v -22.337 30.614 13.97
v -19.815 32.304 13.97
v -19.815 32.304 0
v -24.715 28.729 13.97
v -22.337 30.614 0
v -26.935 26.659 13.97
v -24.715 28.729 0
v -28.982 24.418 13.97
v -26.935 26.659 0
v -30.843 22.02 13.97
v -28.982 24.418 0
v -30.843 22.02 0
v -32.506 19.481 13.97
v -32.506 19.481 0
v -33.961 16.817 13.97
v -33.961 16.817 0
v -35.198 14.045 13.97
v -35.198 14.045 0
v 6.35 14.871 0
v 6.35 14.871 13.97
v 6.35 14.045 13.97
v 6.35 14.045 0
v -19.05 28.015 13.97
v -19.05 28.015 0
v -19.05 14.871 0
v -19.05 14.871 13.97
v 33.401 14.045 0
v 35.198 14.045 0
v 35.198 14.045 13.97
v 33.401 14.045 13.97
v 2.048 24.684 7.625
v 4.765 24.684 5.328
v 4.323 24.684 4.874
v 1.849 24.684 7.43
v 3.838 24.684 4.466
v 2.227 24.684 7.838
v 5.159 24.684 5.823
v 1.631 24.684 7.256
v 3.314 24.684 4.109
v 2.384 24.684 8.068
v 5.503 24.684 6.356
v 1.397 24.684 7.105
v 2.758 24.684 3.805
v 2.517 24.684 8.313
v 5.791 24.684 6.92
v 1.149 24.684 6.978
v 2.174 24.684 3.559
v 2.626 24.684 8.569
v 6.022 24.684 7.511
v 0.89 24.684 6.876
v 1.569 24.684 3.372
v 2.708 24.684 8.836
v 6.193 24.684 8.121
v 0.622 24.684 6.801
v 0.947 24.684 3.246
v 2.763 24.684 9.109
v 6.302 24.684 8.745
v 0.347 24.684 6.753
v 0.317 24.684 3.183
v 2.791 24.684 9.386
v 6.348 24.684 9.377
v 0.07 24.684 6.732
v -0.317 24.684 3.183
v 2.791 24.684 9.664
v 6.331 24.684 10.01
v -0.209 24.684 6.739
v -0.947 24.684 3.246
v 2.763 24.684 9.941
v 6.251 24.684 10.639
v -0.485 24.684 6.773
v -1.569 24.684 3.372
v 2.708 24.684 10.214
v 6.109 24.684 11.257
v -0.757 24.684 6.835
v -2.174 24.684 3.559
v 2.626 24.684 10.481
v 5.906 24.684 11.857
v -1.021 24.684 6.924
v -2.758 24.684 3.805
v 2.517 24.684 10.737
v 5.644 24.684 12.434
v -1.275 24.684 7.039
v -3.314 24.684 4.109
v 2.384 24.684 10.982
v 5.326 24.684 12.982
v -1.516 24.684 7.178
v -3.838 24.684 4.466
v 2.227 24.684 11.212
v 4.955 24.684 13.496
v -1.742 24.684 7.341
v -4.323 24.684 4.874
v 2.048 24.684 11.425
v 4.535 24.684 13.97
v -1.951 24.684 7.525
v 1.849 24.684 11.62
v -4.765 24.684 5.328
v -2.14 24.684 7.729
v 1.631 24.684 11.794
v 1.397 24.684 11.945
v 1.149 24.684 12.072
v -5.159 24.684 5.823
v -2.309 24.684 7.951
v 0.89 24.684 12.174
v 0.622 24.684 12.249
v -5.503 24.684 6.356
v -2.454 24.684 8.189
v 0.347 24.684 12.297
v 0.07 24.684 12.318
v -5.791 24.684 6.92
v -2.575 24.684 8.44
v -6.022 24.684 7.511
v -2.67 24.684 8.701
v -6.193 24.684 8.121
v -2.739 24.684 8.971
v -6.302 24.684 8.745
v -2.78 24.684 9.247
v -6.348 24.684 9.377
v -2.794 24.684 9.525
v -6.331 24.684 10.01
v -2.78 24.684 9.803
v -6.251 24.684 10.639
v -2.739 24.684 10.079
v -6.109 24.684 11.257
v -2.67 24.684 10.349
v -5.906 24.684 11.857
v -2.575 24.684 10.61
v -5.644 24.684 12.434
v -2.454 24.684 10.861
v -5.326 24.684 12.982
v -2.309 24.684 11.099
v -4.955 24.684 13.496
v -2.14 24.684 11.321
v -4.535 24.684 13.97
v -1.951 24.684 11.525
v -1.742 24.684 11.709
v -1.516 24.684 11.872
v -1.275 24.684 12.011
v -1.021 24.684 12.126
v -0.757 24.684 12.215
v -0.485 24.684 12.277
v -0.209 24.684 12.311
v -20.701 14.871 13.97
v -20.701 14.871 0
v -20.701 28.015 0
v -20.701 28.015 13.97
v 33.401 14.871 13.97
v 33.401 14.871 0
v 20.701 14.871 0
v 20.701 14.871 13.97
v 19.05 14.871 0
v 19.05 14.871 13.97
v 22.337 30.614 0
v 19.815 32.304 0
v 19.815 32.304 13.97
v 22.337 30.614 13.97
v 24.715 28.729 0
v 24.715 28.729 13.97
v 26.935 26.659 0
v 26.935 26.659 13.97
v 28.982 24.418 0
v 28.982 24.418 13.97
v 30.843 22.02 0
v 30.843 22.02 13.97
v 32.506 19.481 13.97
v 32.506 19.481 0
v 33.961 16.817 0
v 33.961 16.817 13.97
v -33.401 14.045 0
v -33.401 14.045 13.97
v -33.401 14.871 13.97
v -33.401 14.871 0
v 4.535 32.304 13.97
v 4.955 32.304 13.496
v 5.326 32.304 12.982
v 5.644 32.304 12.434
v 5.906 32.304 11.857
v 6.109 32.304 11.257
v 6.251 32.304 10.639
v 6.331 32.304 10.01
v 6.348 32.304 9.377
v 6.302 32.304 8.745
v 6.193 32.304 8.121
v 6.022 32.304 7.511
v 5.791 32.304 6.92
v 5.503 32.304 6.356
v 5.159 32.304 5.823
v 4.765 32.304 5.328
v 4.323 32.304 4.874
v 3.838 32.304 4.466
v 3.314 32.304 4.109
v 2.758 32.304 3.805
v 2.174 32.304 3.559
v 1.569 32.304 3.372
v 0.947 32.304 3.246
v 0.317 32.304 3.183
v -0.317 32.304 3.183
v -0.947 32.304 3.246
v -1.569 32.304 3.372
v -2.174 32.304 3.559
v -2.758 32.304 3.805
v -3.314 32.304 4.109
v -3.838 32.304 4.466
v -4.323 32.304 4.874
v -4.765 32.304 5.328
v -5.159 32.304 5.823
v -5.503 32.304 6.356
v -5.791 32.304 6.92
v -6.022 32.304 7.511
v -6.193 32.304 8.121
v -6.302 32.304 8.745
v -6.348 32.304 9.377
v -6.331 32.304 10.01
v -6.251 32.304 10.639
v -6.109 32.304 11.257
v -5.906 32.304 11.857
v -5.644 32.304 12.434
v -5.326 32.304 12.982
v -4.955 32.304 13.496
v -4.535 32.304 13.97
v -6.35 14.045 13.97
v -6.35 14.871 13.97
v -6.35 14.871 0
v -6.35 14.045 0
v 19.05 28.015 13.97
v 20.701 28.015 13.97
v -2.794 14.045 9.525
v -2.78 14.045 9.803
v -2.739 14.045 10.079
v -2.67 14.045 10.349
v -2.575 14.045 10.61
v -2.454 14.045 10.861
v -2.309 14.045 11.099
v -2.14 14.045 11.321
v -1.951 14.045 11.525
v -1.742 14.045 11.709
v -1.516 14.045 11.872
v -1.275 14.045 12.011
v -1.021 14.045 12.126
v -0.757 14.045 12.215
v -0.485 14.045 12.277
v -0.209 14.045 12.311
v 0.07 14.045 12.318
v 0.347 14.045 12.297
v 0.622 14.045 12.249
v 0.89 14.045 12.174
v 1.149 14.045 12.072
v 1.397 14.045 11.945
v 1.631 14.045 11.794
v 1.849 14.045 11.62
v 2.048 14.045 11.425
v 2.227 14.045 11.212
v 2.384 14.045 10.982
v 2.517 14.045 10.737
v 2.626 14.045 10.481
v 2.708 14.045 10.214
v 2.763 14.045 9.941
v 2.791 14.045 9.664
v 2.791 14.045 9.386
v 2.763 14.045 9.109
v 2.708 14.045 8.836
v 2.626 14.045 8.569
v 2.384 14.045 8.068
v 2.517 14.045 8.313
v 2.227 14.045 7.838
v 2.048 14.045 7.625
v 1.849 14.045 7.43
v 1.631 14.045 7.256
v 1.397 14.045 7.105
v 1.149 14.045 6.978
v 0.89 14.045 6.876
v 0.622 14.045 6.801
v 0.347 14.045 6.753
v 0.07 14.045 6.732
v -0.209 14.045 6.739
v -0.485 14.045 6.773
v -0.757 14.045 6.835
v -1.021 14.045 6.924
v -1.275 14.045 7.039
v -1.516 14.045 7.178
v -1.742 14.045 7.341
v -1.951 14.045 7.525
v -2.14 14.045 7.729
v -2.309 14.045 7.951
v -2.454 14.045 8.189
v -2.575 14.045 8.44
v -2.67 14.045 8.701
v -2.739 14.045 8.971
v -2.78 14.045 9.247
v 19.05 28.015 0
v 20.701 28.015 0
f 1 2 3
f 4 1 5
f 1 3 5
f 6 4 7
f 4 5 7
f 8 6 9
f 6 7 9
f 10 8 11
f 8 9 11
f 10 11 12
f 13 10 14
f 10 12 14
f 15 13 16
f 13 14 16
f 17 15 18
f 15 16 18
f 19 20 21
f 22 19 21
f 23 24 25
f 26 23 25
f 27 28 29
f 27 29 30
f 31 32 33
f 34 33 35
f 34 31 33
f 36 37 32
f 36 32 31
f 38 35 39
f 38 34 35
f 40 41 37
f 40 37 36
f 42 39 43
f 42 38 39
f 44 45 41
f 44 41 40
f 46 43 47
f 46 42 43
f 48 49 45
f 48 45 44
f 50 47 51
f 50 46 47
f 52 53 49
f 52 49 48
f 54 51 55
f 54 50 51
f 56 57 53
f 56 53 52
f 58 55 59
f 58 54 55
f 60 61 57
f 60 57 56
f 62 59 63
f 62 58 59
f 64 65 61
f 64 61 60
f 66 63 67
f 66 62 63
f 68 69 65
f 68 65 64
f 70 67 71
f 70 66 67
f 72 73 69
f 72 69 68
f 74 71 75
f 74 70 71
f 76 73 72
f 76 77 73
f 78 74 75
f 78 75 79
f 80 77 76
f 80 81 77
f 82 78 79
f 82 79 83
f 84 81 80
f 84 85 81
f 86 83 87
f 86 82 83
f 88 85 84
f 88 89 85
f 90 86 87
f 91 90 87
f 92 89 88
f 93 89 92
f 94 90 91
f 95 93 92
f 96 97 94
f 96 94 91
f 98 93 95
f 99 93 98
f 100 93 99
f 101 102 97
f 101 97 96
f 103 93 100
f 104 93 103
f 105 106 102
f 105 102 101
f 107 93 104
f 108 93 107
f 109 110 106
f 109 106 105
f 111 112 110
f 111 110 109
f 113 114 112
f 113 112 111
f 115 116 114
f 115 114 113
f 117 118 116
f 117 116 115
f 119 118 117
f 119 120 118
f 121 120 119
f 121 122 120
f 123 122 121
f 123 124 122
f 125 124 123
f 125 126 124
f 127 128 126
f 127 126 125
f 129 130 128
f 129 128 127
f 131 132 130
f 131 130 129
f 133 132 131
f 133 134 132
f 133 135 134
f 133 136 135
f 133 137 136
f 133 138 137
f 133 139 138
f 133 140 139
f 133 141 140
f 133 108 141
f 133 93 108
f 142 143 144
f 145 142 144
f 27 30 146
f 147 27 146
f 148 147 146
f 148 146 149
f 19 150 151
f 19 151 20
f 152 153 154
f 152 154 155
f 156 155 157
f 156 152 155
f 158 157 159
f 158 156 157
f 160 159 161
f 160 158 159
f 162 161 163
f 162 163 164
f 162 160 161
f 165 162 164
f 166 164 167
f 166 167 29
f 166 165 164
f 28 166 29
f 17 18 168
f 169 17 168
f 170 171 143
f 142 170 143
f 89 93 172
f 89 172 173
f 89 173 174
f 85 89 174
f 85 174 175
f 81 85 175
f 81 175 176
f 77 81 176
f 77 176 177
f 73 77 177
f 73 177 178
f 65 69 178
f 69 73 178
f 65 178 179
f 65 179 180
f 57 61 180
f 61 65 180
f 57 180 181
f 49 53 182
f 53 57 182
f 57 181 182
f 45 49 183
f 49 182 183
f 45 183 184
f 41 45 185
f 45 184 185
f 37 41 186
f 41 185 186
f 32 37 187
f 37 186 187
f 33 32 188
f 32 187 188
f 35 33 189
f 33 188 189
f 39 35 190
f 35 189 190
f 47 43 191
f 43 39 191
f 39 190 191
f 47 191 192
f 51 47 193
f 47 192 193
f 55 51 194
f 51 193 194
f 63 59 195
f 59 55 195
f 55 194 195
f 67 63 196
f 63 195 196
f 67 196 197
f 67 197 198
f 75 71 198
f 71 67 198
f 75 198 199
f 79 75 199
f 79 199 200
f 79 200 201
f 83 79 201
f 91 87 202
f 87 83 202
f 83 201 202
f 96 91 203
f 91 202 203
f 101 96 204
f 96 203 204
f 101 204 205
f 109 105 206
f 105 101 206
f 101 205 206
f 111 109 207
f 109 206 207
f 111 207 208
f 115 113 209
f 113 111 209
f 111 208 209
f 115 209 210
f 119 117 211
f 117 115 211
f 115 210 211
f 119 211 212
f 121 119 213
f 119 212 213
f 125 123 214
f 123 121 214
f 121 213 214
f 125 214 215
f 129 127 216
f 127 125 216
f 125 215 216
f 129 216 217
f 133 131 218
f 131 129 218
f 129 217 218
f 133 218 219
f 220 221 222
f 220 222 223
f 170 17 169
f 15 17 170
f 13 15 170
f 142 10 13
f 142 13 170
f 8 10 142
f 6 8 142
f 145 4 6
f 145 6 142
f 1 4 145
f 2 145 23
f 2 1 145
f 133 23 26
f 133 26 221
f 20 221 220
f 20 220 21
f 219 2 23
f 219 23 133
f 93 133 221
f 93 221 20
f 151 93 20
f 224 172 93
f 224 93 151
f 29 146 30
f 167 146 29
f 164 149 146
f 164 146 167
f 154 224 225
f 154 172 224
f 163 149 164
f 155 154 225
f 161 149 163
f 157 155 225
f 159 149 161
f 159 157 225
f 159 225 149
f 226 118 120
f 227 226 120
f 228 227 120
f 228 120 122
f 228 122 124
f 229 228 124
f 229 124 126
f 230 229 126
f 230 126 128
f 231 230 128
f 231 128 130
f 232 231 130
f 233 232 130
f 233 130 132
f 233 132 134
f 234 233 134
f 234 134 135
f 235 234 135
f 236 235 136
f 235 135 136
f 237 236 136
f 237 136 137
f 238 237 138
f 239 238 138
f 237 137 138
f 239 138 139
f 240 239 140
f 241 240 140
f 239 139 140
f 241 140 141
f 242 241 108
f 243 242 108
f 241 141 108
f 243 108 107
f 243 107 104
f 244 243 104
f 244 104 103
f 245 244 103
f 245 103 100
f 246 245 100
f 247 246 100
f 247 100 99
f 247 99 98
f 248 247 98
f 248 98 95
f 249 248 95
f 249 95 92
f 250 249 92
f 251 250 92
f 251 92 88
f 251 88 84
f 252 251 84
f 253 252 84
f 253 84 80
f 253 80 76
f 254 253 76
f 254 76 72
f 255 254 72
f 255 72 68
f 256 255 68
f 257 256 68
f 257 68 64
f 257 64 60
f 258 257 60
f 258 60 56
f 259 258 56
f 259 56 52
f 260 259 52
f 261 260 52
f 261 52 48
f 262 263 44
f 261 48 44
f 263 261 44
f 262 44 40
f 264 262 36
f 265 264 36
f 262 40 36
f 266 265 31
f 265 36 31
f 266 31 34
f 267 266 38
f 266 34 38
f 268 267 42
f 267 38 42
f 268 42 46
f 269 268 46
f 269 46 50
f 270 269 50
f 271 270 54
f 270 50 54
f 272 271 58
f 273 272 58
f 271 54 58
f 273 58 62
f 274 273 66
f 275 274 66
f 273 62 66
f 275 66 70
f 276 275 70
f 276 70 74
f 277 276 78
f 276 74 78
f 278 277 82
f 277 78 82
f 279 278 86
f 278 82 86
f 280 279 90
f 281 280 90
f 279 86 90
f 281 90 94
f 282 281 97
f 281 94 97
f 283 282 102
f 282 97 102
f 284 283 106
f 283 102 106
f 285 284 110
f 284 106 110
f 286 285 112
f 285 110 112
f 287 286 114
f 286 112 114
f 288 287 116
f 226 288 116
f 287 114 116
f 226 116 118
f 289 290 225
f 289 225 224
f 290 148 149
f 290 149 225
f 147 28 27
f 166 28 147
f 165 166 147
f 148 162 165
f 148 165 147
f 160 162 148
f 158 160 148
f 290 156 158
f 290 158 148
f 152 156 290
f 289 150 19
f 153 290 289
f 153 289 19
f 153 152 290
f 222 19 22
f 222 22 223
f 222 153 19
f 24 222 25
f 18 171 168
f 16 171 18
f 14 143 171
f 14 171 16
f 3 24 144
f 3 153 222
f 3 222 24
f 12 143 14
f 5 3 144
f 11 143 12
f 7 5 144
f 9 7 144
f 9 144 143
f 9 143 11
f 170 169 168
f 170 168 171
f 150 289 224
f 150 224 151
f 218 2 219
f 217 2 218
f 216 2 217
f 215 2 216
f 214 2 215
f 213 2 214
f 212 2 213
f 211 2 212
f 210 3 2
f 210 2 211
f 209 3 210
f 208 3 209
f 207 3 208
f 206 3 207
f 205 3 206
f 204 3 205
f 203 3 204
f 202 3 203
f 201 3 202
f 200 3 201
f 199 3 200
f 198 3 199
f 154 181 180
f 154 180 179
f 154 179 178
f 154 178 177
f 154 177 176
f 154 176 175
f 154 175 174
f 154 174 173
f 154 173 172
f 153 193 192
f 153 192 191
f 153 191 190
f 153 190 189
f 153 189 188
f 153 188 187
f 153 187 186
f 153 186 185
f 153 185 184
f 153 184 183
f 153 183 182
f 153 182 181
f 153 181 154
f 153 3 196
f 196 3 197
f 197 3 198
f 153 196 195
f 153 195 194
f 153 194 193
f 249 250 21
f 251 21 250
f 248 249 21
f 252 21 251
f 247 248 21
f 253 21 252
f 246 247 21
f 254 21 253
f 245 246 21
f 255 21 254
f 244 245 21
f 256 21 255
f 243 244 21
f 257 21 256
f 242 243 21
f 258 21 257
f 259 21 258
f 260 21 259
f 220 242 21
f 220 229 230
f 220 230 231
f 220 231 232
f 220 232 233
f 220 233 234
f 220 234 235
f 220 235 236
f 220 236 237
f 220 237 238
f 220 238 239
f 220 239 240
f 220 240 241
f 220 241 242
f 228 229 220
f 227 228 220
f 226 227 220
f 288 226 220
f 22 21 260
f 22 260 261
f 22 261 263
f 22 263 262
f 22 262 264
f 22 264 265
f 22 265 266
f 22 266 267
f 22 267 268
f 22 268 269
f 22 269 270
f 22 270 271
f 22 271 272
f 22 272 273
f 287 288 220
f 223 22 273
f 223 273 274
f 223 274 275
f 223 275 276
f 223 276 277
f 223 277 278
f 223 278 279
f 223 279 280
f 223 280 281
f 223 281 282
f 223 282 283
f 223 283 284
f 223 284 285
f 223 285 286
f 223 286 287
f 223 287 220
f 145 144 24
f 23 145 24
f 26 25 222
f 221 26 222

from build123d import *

# Parameters (mm, degrees)
F1_DEPTH = 19.05
F3_R     = 2.794
F4_DEPTH = 18.258491
F5_R     = 6.35
F6_DEPTH = 7.62
F7_W     = 82.632937
F7_H     = 21.472244
F8_DEPTH = 5.08


with BuildPart() as f1:
    # F0 (on Top) → F1 (new body)
    with BuildSketch(Plane.XY):
        with BuildLine():
            Line((0, 32.303751), (-19.815022, 32.303751))
            ThreePointArc((-19.815022, 32.303751), (-28.981906, 24.417547), (-35.197985, 14.04526))
            Line((-35.197985, 14.04526), (-33.401, 14.04526))
            Line((-33.401, 14.04526), (-33.401, 14.87076))
            Line((-33.401, 14.87076), (-20.701, 14.87076))
            Line((-20.701, 14.87076), (-20.701, 28.01526))
            Line((-20.701, 28.01526), (-19.05, 28.01526))
            Line((-19.05, 28.01526), (-19.05, 14.87076))
            Line((-19.05, 14.87076), (-6.35, 14.87076))
            Line((-6.35, 14.87076), (-6.35, 14.04526))
            Line((-6.35, 14.04526), (0, 14.04526))
            Line((0, 14.04526), (0, 32.303751))
        make_face()
    extrude(amount=F1_DEPTH)

    # F2: F1 across plane


with BuildPart() as f1_1:
    add(f1.part)
    add(f1.part.mirror(Plane.YZ))

    # F3 (on face) → F4 (cut, through all)
    with BuildSketch(Plane(origin=(0, 32.303751, 0), x_dir=(-1, 0, 0), z_dir=(0, 1, 0))):
        with Locations((0, 9.525)):
            Circle(F3_R)
    extrude(amount=-F4_DEPTH, mode=Mode.SUBTRACT)

    # F5 (on face) → F6 (cut)
    with BuildSketch(Plane(origin=(0, 32.303751, 0), x_dir=(-1, 0, 0), z_dir=(0, 1, 0))):
        with Locations((0, 9.525)):
            Circle(F5_R)
    extrude(amount=-F6_DEPTH, mode=Mode.SUBTRACT)

    # F7 (on face) → F8 (cut)
    with BuildSketch(Plane.XY.offset(19.05)):
        with Locations((1.089636, 23.172186)):
            Rectangle(F7_W, F7_H)
    extrude(amount=-F8_DEPTH, mode=Mode.SUBTRACT)


solid = f1_1.part
